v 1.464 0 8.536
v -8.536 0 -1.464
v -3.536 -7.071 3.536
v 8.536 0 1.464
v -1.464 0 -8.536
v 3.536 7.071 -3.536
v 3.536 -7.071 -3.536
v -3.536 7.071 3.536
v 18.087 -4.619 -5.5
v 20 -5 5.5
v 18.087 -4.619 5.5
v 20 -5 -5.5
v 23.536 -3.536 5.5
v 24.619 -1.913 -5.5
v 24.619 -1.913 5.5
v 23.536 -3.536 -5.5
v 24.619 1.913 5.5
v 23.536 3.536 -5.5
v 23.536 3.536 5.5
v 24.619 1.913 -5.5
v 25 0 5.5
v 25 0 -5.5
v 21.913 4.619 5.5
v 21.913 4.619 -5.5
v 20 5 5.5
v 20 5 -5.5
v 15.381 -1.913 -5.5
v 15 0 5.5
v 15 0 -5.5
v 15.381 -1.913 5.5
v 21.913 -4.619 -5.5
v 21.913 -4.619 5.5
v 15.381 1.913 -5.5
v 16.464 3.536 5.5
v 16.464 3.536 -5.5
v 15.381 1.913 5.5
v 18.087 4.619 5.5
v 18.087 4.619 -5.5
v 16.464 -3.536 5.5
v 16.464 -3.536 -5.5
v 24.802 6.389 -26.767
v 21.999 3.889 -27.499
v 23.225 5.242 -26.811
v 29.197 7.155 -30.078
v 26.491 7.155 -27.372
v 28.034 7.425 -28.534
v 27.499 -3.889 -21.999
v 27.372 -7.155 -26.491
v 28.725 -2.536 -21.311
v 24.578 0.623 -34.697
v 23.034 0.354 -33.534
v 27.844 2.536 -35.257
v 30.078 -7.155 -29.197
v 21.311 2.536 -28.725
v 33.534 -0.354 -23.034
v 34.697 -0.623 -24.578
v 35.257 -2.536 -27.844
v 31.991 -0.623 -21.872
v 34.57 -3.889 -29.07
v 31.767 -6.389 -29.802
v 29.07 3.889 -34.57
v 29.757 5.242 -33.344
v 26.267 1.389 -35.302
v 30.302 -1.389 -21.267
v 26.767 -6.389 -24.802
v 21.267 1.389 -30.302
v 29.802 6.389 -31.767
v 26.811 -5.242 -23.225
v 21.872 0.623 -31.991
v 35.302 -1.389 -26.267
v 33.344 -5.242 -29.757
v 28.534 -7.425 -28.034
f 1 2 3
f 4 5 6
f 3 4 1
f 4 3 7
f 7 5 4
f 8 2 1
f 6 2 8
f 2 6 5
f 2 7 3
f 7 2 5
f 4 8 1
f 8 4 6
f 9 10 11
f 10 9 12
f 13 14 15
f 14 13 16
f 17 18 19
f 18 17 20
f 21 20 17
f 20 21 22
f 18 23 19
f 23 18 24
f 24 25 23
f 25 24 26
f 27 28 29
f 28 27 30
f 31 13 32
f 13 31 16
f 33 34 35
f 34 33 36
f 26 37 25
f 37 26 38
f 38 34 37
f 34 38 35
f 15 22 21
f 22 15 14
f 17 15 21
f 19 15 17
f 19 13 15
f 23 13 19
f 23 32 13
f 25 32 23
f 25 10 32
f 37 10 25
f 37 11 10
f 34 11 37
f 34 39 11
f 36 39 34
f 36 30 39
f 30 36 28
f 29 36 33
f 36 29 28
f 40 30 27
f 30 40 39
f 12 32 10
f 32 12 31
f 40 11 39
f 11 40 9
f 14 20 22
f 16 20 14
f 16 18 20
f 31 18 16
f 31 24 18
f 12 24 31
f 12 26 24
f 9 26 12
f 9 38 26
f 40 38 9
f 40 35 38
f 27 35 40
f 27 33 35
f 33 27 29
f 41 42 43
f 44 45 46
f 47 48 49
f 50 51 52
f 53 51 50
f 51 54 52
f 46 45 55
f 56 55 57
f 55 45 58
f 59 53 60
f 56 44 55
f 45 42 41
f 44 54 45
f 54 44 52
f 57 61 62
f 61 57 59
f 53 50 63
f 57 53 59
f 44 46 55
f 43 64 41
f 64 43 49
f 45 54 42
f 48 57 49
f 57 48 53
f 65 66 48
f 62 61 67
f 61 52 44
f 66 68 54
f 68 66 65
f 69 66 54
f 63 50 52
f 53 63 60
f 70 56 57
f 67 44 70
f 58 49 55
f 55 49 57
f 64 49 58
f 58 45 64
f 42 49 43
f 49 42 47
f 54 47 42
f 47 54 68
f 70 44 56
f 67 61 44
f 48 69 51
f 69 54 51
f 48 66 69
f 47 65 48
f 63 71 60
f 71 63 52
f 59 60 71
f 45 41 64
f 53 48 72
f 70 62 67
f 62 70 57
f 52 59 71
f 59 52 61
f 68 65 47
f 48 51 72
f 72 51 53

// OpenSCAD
module test (){
    rotate ([45,45,0])children(0);
    translate([20,0,0])children(1);
    rotate ([45,45,0]) translate([40,0,0])children(1);
}

test (){
    //children0
    cube(size=10, center=true);

    //children1
    cylinder(11,r=5, center=true);

    //children2
    cube([5,5,10], center=true);
}
